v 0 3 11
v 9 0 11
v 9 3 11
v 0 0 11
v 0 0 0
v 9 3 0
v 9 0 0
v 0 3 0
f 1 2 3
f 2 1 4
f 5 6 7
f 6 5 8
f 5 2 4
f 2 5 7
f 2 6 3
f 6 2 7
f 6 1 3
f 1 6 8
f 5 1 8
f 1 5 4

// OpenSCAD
// Generated by SolidPython 1.0.1 on 2020-07-29 00:46:55


cube(size = [9, 3, 11]);
/***********************************************
*********      SolidPython code:      **********
************************************************
 
# import packages: SolidPython
from solid import *
from solid.utils import *
from itertools import chain, combinations, permutations


class Resize:

    def __init__(self, scad_file):
        self.scad_file = scad_file
        #self.scad_file = import_scad(scad_file)
        # cone/cylinder param:
        self.r1 = 0
        self.r2 = 0
        self.h = 0
        # rectangular prism param:
        self.w = 0
        self.l = 0
        # ellipse param:
        self.r = 0

    # import OpenScad code (file name corresponds to shape)


    # classify shape + parameters
    def assign(self, param1, param2, param3):
        if self.scad_file == 'cone.scad':
            self.r1 = param1
            self.r2 = param2
            self.h = param3
        elif self.scad_file == 'cylinder.scad':
            self.r1 = param1
            self.r2 = param2
            self.h = param3
        elif self.scad_file == 'rectangularPrism.scad':
            self.h = param1
            self.l = param2
            self.w = param3
        else:
            self.r = param1
            self.h = param2

    # resize parameters
    def iterate(self):
        x = range(3, 20, 2)
        i = 1
        if self.scad_file == 'cone.scad':
            tempList = list(permutations(x, 2))
            for temp in tempList:
                param1 = temp[0]
                param2 = temp[1]
                filepath = 'produced_scad_files/' + 'cone' + str(param1) + '_' + str(param2) + '_' + '.scad'
                scad_render_to_file(cylinder(h=param1, r1=param2, r2=0), filepath)

        elif self.scad_file == 'cylinder.scad':
            tempList = list(permutations(x, 3))
            for temp in tempList:
                param1 = temp[0]
                param2 = temp[1]
                filepath = 'produced_scad_files/' + 'cylinder' + str(param1) + '_' + str(param2) + '_' + '.scad'
                scad_render_to_file(cylinder(h=param1, r1=param2, r2=param2), filepath)

        elif self.scad_file == 'rectangularPrism.scad':
            tempList = list(permutations(x, 3))
            for temp in tempList:
                param1 = temp[0]
                param2 = temp[1]
                param3 = temp[2]
                filepath = 'produced_scad_files/' + 'rectangularPrism' + str(param1) + '_' + str(param2) + '_' + str(
                    param3) + '.scad'
                scad_render_to_file(cube(size=(param1, param2, param3)), filepath)

        elif self.scad_file == 'ellipse.scad':
            tempList = list(permutations(x, 4))
            for temp in tempList:
                param1 = temp[0]
                param2 = temp[1]
                param3 = temp[2]
                param4 = temp[3]
                filepath = 'produced_scad_files/' + 'ellipse' + str(param1) + '_' + str(param2) + '_' + str(param3) + '_' + str(param4) + '.scad'
                scad_render_to_file(scale([param1, param2, param3])(sphere(r=param4)), filepath)

    def render_to_scadfile(self):
        scad_render_to_file(scad, 'example.scad') 
 
************************************************/
